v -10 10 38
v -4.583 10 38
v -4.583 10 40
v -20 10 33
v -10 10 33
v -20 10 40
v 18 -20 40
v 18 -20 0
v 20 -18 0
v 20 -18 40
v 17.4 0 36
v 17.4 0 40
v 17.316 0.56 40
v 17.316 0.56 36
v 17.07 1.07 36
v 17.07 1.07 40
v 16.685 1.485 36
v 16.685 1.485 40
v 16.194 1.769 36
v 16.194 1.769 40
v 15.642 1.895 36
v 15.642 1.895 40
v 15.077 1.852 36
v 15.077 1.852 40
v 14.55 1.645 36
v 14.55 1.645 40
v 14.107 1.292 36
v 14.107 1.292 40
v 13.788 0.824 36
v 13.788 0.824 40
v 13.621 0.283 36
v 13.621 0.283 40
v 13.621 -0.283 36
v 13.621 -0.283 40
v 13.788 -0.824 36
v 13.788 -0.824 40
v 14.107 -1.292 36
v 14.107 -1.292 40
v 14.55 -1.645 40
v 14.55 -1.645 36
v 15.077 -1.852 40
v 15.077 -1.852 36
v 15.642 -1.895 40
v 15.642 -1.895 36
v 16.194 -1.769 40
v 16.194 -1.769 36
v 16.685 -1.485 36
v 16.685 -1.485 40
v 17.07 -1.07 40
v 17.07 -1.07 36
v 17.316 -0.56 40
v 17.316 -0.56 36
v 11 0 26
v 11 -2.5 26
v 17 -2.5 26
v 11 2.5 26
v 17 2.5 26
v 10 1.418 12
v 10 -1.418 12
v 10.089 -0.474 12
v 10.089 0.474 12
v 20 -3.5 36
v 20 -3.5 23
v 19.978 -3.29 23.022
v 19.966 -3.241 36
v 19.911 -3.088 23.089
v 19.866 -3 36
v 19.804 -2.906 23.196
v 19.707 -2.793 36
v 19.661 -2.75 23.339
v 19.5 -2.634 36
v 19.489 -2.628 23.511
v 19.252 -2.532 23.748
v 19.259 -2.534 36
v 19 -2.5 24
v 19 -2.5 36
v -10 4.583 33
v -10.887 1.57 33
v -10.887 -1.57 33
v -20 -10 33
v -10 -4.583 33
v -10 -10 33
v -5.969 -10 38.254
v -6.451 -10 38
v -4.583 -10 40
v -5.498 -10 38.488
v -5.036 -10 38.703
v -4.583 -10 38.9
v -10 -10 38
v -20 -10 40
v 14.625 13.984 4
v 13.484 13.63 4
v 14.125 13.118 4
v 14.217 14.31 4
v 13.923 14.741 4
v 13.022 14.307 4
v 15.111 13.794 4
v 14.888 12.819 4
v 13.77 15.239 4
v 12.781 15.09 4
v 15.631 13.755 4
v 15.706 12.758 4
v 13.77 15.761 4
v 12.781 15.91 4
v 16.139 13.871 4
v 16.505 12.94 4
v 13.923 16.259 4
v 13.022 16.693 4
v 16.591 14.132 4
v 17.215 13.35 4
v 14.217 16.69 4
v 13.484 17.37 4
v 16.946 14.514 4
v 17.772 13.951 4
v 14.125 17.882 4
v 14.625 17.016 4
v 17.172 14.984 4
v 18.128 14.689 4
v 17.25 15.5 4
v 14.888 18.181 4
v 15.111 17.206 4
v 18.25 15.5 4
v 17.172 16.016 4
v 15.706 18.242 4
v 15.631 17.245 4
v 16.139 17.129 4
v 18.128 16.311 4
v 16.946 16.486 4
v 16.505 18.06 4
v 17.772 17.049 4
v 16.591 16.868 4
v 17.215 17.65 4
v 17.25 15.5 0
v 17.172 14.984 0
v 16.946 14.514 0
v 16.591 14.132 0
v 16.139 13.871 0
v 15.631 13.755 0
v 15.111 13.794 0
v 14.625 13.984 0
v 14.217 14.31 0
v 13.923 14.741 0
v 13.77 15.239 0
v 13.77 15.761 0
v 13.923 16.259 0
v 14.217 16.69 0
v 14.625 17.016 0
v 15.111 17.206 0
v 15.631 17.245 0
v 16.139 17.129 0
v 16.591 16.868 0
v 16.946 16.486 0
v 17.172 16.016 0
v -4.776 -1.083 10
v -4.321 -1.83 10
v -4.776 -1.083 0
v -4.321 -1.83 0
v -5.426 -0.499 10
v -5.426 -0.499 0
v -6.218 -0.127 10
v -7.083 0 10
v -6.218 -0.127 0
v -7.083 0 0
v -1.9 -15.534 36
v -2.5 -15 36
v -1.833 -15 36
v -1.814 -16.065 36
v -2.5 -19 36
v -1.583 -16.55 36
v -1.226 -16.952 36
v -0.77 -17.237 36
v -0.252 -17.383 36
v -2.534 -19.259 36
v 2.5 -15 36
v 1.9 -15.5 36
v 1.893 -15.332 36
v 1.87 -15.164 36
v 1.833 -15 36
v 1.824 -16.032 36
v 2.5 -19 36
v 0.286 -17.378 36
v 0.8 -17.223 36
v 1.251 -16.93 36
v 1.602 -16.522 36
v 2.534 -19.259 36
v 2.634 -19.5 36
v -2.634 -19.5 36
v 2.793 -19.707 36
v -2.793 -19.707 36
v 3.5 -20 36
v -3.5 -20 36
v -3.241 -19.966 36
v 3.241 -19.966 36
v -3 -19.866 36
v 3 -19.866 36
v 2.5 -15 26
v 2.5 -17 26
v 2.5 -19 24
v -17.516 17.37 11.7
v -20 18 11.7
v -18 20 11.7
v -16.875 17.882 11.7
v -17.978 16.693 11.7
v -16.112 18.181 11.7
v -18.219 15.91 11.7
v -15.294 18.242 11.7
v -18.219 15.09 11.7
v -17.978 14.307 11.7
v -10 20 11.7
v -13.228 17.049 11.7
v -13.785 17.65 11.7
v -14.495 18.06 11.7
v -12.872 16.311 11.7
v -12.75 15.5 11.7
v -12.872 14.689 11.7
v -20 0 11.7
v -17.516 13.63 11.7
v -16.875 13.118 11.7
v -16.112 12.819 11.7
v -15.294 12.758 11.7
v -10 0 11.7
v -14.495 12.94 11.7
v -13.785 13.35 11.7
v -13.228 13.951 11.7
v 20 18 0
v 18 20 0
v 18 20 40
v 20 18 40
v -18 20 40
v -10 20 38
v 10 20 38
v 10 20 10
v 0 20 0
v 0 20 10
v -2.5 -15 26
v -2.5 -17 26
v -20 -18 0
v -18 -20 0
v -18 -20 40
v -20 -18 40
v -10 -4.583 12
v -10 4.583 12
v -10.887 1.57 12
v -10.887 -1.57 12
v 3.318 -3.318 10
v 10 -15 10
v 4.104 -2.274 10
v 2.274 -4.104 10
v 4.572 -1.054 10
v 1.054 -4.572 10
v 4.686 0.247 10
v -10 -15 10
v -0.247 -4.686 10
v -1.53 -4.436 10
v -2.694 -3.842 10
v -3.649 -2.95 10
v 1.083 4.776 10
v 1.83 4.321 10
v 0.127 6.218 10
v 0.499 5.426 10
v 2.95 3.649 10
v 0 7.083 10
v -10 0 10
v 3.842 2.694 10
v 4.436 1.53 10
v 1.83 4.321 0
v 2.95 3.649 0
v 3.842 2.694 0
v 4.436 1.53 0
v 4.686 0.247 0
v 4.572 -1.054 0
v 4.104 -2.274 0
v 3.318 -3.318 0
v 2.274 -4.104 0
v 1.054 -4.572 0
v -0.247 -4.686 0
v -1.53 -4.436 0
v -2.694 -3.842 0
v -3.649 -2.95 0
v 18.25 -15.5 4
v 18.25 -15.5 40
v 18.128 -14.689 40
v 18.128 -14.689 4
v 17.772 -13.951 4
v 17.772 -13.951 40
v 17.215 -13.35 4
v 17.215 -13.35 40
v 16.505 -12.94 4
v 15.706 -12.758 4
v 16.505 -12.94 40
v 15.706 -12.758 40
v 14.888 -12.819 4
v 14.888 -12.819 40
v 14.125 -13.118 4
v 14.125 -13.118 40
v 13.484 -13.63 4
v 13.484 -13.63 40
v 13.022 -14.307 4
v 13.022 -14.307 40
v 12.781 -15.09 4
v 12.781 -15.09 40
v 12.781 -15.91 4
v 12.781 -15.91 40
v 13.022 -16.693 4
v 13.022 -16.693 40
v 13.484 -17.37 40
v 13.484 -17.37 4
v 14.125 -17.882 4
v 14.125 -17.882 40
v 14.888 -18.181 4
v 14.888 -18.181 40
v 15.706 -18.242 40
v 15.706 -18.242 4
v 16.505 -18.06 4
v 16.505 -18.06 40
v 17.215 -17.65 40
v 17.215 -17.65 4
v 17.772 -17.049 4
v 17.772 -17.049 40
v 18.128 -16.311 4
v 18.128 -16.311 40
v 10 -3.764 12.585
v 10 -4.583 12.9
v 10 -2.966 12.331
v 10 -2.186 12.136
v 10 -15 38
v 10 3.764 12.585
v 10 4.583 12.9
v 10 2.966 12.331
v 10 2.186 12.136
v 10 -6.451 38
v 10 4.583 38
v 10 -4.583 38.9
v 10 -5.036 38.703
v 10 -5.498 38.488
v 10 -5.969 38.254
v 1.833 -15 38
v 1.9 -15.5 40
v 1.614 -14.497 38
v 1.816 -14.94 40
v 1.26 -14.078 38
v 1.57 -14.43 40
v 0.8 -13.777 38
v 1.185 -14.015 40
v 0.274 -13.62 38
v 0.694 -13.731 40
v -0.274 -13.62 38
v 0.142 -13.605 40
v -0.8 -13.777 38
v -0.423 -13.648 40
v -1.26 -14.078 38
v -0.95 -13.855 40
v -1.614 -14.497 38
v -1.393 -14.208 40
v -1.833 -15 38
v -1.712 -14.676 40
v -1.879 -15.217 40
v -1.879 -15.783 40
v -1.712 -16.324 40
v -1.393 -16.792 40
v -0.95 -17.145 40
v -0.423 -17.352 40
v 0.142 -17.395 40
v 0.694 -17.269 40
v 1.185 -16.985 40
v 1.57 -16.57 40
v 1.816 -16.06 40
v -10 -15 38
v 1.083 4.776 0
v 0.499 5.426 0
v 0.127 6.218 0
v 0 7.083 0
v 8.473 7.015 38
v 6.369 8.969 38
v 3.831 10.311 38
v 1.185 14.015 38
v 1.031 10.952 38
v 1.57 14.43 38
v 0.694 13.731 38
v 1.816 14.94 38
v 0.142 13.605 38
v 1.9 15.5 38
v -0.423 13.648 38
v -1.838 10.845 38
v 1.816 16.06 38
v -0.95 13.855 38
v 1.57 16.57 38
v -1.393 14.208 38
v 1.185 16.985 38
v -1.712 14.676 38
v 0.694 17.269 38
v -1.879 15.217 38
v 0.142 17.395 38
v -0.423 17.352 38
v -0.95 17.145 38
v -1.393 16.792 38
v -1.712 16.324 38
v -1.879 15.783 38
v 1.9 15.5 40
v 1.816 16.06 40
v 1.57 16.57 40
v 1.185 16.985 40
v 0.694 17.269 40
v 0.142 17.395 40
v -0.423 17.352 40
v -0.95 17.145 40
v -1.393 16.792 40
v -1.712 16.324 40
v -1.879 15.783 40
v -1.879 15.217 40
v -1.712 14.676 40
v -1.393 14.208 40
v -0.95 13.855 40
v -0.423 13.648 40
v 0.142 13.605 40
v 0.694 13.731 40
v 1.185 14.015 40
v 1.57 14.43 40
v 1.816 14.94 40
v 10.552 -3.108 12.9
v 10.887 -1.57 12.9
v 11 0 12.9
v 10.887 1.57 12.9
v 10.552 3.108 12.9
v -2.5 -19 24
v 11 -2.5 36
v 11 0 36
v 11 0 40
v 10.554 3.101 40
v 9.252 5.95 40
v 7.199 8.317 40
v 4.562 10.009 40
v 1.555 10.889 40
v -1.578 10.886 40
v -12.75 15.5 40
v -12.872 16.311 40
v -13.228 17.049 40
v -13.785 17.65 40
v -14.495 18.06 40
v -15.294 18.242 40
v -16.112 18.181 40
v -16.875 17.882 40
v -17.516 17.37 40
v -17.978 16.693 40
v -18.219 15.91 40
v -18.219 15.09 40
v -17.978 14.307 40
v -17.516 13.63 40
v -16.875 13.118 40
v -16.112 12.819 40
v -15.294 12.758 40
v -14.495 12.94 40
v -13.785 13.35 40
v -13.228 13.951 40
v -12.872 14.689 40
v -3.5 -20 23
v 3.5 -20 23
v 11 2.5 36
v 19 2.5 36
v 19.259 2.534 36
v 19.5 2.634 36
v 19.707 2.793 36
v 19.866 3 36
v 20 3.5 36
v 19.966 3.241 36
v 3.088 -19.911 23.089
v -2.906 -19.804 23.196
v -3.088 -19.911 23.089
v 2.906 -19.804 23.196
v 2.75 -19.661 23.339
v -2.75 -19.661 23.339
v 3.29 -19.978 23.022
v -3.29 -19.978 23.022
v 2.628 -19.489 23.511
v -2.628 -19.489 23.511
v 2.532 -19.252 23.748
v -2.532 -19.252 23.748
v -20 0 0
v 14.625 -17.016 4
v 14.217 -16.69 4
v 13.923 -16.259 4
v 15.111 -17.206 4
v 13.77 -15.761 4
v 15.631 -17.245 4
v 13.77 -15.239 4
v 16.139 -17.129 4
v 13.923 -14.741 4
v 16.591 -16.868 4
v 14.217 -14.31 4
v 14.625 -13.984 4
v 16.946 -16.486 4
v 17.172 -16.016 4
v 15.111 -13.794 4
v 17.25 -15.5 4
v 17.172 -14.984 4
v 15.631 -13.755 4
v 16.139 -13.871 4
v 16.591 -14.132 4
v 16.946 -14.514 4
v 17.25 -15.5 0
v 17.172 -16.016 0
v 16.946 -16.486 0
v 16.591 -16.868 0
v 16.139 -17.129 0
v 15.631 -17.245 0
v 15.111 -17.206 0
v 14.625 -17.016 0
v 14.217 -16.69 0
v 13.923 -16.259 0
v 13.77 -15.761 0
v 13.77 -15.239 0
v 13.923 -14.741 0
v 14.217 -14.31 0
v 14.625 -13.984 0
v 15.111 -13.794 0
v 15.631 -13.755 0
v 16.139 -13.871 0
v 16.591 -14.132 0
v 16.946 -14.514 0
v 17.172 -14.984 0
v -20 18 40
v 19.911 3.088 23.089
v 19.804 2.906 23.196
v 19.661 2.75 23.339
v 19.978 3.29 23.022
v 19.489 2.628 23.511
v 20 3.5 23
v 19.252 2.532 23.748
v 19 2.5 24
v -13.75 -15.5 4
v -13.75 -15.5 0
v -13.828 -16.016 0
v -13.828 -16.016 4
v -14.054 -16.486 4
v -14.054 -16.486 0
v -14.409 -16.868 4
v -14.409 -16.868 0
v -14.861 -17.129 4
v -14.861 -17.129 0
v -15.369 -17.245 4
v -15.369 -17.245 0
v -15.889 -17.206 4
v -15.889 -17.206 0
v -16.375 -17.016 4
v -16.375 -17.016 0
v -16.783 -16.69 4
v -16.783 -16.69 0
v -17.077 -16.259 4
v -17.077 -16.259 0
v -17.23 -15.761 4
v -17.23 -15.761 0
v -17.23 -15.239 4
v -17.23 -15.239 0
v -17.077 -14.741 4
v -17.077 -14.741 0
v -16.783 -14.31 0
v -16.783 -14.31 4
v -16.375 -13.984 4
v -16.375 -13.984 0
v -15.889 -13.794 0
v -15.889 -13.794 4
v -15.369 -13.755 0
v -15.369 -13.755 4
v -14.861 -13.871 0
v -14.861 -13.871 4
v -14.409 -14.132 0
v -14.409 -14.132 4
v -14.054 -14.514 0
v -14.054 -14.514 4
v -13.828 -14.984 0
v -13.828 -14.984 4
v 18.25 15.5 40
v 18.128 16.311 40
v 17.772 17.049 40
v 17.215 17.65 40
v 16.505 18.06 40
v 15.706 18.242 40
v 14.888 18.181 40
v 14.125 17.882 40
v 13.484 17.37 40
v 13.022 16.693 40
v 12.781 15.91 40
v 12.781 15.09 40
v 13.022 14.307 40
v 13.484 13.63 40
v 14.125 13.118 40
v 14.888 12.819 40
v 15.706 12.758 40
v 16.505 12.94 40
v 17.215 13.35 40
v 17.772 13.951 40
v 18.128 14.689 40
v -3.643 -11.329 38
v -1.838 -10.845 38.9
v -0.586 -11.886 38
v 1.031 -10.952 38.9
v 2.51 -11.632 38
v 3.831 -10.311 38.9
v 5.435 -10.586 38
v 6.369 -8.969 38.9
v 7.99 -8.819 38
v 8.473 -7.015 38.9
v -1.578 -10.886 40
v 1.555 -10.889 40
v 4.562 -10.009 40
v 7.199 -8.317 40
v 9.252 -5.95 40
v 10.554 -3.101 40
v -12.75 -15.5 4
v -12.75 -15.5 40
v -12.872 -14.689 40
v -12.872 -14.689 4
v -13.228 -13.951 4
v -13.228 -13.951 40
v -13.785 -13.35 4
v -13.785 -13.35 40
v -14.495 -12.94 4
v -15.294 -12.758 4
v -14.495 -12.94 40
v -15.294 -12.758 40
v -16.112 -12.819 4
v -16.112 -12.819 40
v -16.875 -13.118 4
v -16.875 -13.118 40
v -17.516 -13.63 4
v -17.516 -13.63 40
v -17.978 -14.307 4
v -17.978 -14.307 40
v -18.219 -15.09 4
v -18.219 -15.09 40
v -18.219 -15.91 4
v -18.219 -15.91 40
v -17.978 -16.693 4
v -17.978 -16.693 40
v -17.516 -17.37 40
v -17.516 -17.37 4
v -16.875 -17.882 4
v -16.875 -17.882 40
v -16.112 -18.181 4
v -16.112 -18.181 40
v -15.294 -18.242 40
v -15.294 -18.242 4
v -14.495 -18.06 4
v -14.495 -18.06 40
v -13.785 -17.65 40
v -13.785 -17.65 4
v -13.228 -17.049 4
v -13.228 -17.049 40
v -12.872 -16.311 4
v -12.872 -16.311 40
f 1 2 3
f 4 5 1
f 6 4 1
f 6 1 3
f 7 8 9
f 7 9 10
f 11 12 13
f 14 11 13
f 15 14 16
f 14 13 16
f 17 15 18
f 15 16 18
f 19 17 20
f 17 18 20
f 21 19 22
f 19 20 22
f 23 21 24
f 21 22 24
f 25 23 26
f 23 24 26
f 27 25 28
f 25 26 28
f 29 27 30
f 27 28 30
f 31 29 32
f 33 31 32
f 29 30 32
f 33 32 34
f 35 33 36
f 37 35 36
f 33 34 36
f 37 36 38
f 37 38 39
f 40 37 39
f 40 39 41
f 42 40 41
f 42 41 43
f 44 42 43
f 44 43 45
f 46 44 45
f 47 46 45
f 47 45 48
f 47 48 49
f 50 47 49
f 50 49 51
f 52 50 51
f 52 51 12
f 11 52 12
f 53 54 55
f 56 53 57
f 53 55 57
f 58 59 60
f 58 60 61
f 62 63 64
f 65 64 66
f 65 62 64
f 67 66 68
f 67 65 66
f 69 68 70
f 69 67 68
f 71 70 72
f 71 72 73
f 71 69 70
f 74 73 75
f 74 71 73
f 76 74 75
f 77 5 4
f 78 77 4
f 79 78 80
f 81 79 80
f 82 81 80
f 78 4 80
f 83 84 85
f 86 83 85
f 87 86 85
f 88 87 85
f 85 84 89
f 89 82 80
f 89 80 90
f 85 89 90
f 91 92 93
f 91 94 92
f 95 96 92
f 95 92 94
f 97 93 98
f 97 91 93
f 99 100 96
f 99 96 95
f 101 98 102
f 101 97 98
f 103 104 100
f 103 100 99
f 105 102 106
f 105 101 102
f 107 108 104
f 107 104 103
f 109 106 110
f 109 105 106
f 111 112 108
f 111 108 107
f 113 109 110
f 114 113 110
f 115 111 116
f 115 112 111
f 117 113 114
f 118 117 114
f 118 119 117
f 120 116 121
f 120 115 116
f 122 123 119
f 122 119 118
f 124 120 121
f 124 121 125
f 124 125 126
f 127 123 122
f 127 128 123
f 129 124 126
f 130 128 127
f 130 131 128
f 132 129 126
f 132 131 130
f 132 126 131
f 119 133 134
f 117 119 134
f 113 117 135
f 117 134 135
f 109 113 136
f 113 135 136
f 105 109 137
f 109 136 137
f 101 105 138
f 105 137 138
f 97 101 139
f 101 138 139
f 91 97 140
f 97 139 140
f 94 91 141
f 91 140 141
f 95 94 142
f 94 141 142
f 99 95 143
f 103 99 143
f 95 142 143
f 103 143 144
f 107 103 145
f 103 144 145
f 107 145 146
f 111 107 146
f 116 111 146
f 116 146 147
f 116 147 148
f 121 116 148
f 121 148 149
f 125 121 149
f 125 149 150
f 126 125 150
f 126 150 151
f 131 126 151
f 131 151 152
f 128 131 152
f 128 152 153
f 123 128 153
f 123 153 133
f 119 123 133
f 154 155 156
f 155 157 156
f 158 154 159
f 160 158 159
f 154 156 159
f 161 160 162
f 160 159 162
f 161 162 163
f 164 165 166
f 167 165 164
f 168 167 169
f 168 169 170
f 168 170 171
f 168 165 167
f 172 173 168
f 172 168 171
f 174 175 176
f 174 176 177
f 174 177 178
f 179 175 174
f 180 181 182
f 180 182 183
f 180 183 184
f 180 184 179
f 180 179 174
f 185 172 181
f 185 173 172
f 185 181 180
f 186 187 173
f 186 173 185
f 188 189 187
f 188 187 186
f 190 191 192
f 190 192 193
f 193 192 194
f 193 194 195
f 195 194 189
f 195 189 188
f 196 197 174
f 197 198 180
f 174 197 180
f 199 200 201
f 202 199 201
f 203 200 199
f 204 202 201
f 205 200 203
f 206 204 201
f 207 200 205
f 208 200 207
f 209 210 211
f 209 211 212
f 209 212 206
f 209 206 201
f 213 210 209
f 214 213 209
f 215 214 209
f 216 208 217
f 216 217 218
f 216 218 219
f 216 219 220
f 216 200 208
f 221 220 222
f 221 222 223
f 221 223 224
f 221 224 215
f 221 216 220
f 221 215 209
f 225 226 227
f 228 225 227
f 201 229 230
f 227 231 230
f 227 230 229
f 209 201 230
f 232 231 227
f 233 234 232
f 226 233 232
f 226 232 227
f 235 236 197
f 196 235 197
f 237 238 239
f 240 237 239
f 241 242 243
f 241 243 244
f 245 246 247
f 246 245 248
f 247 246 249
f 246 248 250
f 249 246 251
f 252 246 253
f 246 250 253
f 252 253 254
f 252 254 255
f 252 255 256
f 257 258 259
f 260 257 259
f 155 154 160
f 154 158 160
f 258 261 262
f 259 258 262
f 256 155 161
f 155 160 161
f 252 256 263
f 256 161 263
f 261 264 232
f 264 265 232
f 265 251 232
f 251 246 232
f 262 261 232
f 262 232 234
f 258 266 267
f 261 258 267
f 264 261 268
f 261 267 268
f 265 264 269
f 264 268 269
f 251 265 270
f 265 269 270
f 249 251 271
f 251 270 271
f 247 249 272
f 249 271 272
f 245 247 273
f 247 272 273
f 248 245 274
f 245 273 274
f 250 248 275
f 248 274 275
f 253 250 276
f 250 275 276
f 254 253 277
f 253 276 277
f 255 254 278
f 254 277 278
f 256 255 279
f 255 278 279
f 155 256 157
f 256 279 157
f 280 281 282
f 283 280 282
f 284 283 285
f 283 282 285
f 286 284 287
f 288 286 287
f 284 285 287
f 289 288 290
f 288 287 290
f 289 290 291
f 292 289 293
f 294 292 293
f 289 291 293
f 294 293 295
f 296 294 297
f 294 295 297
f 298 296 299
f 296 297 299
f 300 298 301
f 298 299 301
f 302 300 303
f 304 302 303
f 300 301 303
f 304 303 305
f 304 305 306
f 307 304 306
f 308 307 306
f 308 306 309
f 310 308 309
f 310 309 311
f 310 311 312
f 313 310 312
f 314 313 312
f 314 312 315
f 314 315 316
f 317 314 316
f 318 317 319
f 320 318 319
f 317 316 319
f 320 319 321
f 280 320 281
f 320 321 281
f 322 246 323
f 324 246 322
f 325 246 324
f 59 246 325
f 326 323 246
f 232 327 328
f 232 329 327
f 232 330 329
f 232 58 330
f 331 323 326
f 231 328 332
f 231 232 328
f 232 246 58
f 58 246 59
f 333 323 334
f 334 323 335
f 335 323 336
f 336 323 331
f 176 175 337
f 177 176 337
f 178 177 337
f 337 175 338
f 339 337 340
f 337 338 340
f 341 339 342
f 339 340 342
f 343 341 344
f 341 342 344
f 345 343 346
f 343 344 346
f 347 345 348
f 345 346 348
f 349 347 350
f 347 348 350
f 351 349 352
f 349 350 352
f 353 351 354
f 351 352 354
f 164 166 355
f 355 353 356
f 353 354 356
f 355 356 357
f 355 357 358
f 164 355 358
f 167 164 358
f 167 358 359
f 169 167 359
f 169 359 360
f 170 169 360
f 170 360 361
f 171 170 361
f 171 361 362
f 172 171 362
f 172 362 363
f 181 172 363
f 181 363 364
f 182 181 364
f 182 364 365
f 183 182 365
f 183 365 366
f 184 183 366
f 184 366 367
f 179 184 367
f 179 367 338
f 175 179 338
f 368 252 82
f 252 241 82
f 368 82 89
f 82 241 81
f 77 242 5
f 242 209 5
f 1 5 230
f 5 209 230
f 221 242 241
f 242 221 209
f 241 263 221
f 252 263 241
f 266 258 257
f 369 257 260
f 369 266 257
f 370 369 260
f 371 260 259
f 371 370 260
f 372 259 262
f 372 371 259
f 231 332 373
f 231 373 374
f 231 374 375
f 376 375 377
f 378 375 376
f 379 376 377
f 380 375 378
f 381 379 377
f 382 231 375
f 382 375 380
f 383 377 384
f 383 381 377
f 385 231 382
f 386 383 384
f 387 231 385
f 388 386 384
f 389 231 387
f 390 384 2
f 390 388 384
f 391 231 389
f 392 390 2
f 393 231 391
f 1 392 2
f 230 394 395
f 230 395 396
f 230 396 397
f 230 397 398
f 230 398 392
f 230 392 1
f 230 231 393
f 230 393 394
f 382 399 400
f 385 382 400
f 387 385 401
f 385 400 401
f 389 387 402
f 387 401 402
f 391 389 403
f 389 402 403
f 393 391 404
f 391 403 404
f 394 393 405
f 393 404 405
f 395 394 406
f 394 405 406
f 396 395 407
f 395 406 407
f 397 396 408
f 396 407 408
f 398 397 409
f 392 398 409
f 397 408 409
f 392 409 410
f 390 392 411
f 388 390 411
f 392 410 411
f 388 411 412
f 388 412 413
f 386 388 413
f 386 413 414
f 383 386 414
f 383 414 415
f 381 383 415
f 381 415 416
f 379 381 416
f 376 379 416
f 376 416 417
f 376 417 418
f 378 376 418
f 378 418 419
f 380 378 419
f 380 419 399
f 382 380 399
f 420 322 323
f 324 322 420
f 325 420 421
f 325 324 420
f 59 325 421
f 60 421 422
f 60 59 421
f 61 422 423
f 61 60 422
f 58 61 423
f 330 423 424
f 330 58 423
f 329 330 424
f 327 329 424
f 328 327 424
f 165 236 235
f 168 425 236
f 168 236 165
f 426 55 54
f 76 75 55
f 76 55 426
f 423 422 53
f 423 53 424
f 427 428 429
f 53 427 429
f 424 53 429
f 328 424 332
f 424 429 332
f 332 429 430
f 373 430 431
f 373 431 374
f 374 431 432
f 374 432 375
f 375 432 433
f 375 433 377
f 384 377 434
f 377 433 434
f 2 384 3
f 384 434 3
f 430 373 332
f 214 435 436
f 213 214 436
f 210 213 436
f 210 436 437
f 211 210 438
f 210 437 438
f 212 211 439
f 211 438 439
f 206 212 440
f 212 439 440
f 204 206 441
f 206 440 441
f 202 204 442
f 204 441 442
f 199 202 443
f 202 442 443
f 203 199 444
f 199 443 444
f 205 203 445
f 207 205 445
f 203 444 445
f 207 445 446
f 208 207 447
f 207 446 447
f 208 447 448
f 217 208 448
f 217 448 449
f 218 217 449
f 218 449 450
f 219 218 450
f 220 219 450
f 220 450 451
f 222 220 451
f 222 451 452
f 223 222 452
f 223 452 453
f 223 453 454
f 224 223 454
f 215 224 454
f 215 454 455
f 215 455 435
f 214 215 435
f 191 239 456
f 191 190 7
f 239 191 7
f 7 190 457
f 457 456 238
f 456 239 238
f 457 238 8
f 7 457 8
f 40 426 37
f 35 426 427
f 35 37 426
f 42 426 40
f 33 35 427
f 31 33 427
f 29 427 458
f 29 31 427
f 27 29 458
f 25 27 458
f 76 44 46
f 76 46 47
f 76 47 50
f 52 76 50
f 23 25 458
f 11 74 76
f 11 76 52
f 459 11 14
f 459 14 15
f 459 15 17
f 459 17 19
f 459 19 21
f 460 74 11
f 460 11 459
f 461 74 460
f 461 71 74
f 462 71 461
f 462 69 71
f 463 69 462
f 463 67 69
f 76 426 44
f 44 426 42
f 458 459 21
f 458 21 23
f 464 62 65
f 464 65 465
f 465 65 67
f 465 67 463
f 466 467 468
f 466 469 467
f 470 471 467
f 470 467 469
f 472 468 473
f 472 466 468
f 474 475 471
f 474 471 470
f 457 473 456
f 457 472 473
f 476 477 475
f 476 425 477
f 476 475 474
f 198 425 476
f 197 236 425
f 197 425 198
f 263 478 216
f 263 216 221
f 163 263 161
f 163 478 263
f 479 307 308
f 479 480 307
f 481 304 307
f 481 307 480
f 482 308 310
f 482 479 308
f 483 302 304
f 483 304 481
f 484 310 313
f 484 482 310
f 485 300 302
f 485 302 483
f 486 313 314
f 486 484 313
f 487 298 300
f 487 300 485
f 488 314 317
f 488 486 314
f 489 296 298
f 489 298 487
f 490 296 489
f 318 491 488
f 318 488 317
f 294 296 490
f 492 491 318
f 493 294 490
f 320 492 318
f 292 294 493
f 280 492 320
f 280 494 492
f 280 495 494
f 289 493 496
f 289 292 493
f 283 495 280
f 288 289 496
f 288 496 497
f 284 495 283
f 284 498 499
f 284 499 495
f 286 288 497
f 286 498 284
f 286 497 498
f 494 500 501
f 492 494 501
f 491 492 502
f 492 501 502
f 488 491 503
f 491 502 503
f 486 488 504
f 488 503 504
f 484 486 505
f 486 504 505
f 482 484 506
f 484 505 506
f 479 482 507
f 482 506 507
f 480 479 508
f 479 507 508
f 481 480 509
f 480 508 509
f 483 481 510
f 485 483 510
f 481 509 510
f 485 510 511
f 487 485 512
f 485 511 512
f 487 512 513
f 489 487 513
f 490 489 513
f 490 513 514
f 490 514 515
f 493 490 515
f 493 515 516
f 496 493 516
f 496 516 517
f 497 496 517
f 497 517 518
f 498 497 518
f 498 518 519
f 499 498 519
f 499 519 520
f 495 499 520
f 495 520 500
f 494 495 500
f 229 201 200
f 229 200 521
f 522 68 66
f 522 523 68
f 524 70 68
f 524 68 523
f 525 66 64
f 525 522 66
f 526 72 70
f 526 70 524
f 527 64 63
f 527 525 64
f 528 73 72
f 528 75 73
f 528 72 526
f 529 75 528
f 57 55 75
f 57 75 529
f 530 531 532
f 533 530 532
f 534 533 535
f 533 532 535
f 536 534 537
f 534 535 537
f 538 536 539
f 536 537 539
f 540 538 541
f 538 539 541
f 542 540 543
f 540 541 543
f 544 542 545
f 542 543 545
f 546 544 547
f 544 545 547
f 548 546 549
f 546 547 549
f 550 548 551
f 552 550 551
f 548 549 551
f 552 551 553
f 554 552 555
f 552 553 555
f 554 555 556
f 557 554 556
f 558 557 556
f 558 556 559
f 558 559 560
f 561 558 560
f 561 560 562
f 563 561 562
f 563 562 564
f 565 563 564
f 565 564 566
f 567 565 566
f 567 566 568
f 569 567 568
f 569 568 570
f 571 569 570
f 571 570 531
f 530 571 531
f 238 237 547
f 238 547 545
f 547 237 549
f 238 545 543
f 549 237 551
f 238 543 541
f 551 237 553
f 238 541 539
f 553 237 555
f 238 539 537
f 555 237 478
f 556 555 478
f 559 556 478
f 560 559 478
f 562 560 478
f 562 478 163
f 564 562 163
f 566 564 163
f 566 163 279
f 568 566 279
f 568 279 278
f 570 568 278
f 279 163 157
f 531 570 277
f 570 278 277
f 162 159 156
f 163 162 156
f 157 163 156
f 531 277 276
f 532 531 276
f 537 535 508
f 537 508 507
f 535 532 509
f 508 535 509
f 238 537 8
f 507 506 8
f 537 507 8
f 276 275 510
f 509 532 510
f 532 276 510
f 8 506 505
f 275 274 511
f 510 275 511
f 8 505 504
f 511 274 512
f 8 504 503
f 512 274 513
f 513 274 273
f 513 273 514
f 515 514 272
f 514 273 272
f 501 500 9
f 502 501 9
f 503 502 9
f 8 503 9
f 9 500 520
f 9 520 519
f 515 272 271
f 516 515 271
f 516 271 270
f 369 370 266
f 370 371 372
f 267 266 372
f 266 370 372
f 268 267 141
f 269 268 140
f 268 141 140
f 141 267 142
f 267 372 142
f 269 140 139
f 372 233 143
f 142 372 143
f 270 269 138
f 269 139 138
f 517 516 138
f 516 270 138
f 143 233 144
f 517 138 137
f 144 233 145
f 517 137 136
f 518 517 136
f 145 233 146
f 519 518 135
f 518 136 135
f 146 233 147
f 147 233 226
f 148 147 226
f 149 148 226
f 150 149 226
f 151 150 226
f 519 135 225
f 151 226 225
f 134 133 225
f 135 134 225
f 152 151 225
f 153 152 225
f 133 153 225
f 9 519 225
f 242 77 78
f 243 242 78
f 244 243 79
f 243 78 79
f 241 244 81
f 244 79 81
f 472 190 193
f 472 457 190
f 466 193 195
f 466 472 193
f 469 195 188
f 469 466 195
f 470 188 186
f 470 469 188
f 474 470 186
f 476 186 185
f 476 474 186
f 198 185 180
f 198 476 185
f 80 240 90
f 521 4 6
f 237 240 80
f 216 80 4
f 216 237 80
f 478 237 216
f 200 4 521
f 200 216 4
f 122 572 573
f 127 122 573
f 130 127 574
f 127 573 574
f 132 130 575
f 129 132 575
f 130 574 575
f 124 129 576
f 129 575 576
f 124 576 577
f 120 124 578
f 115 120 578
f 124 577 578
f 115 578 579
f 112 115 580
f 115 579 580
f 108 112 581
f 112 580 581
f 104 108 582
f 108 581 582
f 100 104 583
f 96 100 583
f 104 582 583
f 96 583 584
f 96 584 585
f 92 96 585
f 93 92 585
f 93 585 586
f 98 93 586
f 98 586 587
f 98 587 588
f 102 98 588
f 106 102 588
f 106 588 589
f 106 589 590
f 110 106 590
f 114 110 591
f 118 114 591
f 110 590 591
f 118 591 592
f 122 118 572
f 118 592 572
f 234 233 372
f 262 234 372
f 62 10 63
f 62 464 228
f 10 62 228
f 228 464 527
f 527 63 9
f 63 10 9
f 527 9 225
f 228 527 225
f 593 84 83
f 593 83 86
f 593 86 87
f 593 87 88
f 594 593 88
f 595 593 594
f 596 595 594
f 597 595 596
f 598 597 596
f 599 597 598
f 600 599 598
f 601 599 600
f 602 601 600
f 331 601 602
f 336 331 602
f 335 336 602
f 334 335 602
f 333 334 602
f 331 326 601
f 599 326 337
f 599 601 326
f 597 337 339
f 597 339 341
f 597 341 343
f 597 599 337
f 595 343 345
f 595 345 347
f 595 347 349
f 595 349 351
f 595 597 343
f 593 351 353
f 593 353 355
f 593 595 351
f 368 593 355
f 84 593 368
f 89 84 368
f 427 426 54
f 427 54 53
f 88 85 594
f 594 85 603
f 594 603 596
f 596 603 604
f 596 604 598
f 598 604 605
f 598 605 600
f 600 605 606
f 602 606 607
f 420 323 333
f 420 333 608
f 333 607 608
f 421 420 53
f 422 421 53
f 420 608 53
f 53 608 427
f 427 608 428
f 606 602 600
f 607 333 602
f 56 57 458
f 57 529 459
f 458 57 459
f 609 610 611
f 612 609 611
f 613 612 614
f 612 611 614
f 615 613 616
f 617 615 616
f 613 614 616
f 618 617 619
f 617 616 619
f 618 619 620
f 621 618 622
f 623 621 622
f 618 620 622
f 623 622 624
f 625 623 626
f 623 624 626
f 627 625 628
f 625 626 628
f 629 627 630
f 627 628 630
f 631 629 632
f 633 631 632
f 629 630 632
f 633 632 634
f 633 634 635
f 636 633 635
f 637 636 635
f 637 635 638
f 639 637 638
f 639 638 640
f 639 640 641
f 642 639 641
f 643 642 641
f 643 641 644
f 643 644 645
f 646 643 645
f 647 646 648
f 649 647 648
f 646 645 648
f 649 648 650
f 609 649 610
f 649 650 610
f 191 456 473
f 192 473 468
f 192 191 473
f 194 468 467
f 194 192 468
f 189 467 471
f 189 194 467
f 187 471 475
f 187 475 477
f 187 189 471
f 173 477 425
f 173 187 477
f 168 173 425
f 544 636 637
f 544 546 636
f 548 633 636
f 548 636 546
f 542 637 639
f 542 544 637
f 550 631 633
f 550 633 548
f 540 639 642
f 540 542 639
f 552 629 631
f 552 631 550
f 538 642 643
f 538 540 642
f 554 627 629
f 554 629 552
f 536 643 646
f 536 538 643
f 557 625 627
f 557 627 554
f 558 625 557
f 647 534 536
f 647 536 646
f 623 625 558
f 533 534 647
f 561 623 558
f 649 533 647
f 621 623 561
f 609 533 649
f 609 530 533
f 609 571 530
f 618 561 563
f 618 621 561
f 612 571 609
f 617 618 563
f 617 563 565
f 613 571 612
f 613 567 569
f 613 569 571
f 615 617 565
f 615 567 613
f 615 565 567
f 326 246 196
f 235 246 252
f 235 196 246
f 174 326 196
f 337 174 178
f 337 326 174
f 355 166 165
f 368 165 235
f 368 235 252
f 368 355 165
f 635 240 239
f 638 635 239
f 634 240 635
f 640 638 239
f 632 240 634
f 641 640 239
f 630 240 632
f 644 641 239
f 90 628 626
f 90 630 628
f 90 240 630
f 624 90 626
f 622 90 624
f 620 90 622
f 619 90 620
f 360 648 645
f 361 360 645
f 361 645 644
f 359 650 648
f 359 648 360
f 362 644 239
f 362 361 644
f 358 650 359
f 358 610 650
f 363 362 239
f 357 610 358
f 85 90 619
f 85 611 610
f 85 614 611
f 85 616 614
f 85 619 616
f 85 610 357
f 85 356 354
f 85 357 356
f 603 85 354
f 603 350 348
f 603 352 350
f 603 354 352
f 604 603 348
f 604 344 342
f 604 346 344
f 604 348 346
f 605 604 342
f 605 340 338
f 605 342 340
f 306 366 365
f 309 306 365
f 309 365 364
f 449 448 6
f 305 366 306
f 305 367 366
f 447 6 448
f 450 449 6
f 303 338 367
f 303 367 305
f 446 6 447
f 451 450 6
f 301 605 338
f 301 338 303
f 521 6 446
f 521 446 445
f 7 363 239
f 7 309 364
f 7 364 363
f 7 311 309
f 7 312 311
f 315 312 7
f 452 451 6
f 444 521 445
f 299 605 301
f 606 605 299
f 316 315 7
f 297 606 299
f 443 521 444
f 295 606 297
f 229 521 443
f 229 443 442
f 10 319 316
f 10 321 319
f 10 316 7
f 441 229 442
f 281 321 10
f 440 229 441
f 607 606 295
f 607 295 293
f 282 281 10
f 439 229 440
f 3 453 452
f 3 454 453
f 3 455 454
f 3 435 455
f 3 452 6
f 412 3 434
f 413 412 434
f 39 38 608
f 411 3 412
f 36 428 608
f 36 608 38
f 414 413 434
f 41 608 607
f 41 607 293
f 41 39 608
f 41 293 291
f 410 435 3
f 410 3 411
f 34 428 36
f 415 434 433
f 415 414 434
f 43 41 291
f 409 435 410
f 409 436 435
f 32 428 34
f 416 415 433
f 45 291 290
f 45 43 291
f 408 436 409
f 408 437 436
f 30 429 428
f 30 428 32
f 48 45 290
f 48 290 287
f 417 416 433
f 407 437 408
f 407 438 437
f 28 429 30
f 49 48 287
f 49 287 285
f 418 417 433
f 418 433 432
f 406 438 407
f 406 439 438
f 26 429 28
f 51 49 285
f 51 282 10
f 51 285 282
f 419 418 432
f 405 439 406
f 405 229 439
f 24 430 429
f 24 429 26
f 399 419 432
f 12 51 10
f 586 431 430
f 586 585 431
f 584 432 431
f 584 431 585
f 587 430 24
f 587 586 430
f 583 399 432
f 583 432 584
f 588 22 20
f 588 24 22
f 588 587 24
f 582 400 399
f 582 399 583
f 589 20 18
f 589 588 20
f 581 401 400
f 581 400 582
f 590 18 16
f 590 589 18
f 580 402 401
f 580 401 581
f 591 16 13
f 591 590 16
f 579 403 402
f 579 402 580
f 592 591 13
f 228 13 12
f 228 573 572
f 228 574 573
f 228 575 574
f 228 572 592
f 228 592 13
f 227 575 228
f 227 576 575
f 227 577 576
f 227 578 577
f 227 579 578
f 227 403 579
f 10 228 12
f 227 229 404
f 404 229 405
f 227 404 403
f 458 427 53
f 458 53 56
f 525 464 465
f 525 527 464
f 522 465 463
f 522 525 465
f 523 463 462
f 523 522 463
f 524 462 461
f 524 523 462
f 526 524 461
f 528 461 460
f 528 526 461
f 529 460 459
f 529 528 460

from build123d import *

# Parameters (mm, degrees)
SKETCH004_W     = 40
SKETCH004_H     = 40
PAD001_DEPTH    = 40
SKETCH005_W     = 38.216385
SKETCH005_H     = 40.583008
POCKET002_DEPTH = 11.7
SKETCH006_R     = 1.75
POCKET003_DEPTH = 40.001
SKETCH007_W     = 20
SKETCH007_H     = 28
POCKET004_DEPTH = 35
SKETCH009_R     = 11
POCKET005_DEPTH = 28
SKETCH011_R     = 2.75
POCKET006_DEPTH = 36
SKETCH012_R     = 1.9
POCKET007_DEPTH = 7
CHAMFER003_SIZE = 0.9
SKETCH020_R     = 4.692288
POCKET013_DEPTH = 40.001
FILLET_R        = 3
SKETCH021_W     = 5
SKETCH021_H     = 10
POCKET014_DEPTH = 9
SKETCH022_W     = 5
SKETCH022_H     = 10
POCKET015_DEPTH = 12
SKETCH023_W     = 20
SKETCH023_H     = 14.49538
POCKET016_DEPTH = 20
CHAMFER006_SIZE = 3
CHAMFER007_SIZE = 2
FILLET001_R     = 1


with BuildPart() as part:
    # Sketch004 → Pad001 (new body)
    with BuildSketch(Plane.XY):
        Rectangle(SKETCH004_W, SKETCH004_H)
    extrude(amount=PAD001_DEPTH)

    # Sketch005 (on Face5 of Pad001) → Pocket002 (cut)
    with BuildSketch(Plane(origin=(0, 0, 0), x_dir=(1, 0, 0), z_dir=(0, 0, -1))):
        with Locations((-19.108192, -20.291504)):
            Rectangle(SKETCH005_W, SKETCH005_H)
    extrude(amount=-POCKET002_DEPTH, mode=Mode.SUBTRACT)

    # Sketch006 (on Face4 of Pocket002) → Pocket003 (cut, through all)
    with BuildSketch(Plane(origin=(0, 0, 0), x_dir=(1, 0, 0), z_dir=(0, 0, -1))):
        with Locations((-15.5, 15.5)):
            Circle(SKETCH006_R)
        with Locations((15.5, 15.5)):
            Circle(SKETCH006_R)
        with Locations((-15.5, -15.5)):
            Circle(SKETCH006_R)
        with Locations((15.5, -15.5)):
            Circle(SKETCH006_R)
    extrude(amount=-POCKET003_DEPTH, mode=Mode.SUBTRACT)

    # Sketch007 (on Face1 of Pocket003) → Pocket004 (cut)
    with BuildSketch(Plane(origin=(0, 20, 0), x_dir=(-1, 0, 0), z_dir=(0, 1, 0))):
        with Locations((0, 24)):
            Rectangle(SKETCH007_W, SKETCH007_H)
    extrude(amount=-POCKET004_DEPTH, mode=Mode.SUBTRACT)

    # Sketch009 (on Face9 of Pocket004) → Pocket005 (cut)
    with BuildSketch(Plane.XY.offset(40)):
        Circle(SKETCH009_R)
    extrude(amount=-POCKET005_DEPTH, mode=Mode.SUBTRACT)

    # Sketch011 (on Face9 of Pocket005) → Pocket006 (cut)
    with BuildSketch(Plane.XY.offset(40)):
        with Locations((-15.5, -15.5)):
            Circle(SKETCH011_R)
        with Locations((-15.5, 15.5)):
            Circle(SKETCH011_R)
        with Locations((15.5, 15.5)):
            Circle(SKETCH011_R)
        with Locations((15.5, -15.5)):
            Circle(SKETCH011_R)
    extrude(amount=-POCKET006_DEPTH, mode=Mode.SUBTRACT)

    # Sketch012 (on Face9 of Pocket006) → Pocket007 (cut)
    with BuildSketch(Plane.XY.offset(40)):
        with Locations((0, 15.5)):
            Circle(SKETCH012_R)
        with Locations((15.5, 0)):
            Circle(SKETCH012_R)
        with Locations((0, -15.5)):
            Circle(SKETCH012_R)
        with Locations((-15.5, 0)):
            Circle(SKETCH012_R)
    extrude(amount=-POCKET007_DEPTH, mode=Mode.SUBTRACT)

    # Chamfer003
    chamfer003_edges = [part.edges().sort_by_distance(p)[0] for p in [
        (10.747093, 2.345208, 12),
        (0, -11, 38),
        (10.747093, -2.345208, 12),
    ]]
    chamfer(chamfer003_edges, length=CHAMFER003_SIZE)

    # Sketch020 (on Face19 of Chamfer003) → Pocket013 (cut, through all)
    with BuildSketch(Plane(origin=(0, 0, 0), x_dir=(1, 0, 0), z_dir=(0, 0, -1))):
        Circle(SKETCH020_R)
    extrude(amount=-POCKET013_DEPTH, mode=Mode.SUBTRACT)

    # Fillet
    fillet_edges = [part.edges().sort_by_distance(p)[0] for p in [
        (-4.692288, 0, 5),
        (0, 4.692288, 5),
    ]]
    fillet(fillet_edges, radius=FILLET_R)

    # Sketch021 (on Face22 of Fillet) → Pocket014 (cut)
    with BuildSketch(Plane.YZ.offset(20)):
        with Locations((0, 31)):
            Rectangle(SKETCH021_W, SKETCH021_H)
    extrude(amount=-POCKET014_DEPTH, mode=Mode.SUBTRACT)

    # Sketch022 → Pocket015 (cut)
    with BuildSketch(Plane.XZ.offset(20)):
        with Locations((0, 31)):
            Rectangle(SKETCH022_W, SKETCH022_H)
    extrude(amount=-POCKET015_DEPTH, mode=Mode.SUBTRACT)

    # Sketch023 (on Face13 of Pocket015) → Pocket016 (cut)
    with BuildSketch(Plane(origin=(-20, 0, 0), x_dir=(0, -1, 0), z_dir=(-1, 0, 0))):
        with Locations((0, 40.24769)):
            Rectangle(SKETCH023_W, SKETCH023_H)
    extrude(amount=-POCKET016_DEPTH, mode=Mode.SUBTRACT)

    # Chamfer006
    chamfer006_edges = [part.edges().sort_by_distance(p)[0] for p in [
        (0, -20, 26),
        (20, 0, 26),
    ]]
    chamfer(chamfer006_edges, length=CHAMFER006_SIZE)

    # Chamfer007
    chamfer007_edges = [part.edges().sort_by_distance(p)[0] for p in [
        (-20, -20, 20),
        (-20, 20, 25.85),
        (20, -20, 20),
        (20, 20, 20),
    ]]
    chamfer(chamfer007_edges, length=CHAMFER007_SIZE)

    # Fillet001
    fillet001_edges = [part.edges().sort_by_distance(p)[0] for p in [
        (-2.5, -20, 31),
        (2.5, -20, 31),
        (20, -2.5, 31),
        (20, 2.5, 31),
    ]]
    fillet(fillet001_edges, radius=FILLET001_R)


solid = part.part
